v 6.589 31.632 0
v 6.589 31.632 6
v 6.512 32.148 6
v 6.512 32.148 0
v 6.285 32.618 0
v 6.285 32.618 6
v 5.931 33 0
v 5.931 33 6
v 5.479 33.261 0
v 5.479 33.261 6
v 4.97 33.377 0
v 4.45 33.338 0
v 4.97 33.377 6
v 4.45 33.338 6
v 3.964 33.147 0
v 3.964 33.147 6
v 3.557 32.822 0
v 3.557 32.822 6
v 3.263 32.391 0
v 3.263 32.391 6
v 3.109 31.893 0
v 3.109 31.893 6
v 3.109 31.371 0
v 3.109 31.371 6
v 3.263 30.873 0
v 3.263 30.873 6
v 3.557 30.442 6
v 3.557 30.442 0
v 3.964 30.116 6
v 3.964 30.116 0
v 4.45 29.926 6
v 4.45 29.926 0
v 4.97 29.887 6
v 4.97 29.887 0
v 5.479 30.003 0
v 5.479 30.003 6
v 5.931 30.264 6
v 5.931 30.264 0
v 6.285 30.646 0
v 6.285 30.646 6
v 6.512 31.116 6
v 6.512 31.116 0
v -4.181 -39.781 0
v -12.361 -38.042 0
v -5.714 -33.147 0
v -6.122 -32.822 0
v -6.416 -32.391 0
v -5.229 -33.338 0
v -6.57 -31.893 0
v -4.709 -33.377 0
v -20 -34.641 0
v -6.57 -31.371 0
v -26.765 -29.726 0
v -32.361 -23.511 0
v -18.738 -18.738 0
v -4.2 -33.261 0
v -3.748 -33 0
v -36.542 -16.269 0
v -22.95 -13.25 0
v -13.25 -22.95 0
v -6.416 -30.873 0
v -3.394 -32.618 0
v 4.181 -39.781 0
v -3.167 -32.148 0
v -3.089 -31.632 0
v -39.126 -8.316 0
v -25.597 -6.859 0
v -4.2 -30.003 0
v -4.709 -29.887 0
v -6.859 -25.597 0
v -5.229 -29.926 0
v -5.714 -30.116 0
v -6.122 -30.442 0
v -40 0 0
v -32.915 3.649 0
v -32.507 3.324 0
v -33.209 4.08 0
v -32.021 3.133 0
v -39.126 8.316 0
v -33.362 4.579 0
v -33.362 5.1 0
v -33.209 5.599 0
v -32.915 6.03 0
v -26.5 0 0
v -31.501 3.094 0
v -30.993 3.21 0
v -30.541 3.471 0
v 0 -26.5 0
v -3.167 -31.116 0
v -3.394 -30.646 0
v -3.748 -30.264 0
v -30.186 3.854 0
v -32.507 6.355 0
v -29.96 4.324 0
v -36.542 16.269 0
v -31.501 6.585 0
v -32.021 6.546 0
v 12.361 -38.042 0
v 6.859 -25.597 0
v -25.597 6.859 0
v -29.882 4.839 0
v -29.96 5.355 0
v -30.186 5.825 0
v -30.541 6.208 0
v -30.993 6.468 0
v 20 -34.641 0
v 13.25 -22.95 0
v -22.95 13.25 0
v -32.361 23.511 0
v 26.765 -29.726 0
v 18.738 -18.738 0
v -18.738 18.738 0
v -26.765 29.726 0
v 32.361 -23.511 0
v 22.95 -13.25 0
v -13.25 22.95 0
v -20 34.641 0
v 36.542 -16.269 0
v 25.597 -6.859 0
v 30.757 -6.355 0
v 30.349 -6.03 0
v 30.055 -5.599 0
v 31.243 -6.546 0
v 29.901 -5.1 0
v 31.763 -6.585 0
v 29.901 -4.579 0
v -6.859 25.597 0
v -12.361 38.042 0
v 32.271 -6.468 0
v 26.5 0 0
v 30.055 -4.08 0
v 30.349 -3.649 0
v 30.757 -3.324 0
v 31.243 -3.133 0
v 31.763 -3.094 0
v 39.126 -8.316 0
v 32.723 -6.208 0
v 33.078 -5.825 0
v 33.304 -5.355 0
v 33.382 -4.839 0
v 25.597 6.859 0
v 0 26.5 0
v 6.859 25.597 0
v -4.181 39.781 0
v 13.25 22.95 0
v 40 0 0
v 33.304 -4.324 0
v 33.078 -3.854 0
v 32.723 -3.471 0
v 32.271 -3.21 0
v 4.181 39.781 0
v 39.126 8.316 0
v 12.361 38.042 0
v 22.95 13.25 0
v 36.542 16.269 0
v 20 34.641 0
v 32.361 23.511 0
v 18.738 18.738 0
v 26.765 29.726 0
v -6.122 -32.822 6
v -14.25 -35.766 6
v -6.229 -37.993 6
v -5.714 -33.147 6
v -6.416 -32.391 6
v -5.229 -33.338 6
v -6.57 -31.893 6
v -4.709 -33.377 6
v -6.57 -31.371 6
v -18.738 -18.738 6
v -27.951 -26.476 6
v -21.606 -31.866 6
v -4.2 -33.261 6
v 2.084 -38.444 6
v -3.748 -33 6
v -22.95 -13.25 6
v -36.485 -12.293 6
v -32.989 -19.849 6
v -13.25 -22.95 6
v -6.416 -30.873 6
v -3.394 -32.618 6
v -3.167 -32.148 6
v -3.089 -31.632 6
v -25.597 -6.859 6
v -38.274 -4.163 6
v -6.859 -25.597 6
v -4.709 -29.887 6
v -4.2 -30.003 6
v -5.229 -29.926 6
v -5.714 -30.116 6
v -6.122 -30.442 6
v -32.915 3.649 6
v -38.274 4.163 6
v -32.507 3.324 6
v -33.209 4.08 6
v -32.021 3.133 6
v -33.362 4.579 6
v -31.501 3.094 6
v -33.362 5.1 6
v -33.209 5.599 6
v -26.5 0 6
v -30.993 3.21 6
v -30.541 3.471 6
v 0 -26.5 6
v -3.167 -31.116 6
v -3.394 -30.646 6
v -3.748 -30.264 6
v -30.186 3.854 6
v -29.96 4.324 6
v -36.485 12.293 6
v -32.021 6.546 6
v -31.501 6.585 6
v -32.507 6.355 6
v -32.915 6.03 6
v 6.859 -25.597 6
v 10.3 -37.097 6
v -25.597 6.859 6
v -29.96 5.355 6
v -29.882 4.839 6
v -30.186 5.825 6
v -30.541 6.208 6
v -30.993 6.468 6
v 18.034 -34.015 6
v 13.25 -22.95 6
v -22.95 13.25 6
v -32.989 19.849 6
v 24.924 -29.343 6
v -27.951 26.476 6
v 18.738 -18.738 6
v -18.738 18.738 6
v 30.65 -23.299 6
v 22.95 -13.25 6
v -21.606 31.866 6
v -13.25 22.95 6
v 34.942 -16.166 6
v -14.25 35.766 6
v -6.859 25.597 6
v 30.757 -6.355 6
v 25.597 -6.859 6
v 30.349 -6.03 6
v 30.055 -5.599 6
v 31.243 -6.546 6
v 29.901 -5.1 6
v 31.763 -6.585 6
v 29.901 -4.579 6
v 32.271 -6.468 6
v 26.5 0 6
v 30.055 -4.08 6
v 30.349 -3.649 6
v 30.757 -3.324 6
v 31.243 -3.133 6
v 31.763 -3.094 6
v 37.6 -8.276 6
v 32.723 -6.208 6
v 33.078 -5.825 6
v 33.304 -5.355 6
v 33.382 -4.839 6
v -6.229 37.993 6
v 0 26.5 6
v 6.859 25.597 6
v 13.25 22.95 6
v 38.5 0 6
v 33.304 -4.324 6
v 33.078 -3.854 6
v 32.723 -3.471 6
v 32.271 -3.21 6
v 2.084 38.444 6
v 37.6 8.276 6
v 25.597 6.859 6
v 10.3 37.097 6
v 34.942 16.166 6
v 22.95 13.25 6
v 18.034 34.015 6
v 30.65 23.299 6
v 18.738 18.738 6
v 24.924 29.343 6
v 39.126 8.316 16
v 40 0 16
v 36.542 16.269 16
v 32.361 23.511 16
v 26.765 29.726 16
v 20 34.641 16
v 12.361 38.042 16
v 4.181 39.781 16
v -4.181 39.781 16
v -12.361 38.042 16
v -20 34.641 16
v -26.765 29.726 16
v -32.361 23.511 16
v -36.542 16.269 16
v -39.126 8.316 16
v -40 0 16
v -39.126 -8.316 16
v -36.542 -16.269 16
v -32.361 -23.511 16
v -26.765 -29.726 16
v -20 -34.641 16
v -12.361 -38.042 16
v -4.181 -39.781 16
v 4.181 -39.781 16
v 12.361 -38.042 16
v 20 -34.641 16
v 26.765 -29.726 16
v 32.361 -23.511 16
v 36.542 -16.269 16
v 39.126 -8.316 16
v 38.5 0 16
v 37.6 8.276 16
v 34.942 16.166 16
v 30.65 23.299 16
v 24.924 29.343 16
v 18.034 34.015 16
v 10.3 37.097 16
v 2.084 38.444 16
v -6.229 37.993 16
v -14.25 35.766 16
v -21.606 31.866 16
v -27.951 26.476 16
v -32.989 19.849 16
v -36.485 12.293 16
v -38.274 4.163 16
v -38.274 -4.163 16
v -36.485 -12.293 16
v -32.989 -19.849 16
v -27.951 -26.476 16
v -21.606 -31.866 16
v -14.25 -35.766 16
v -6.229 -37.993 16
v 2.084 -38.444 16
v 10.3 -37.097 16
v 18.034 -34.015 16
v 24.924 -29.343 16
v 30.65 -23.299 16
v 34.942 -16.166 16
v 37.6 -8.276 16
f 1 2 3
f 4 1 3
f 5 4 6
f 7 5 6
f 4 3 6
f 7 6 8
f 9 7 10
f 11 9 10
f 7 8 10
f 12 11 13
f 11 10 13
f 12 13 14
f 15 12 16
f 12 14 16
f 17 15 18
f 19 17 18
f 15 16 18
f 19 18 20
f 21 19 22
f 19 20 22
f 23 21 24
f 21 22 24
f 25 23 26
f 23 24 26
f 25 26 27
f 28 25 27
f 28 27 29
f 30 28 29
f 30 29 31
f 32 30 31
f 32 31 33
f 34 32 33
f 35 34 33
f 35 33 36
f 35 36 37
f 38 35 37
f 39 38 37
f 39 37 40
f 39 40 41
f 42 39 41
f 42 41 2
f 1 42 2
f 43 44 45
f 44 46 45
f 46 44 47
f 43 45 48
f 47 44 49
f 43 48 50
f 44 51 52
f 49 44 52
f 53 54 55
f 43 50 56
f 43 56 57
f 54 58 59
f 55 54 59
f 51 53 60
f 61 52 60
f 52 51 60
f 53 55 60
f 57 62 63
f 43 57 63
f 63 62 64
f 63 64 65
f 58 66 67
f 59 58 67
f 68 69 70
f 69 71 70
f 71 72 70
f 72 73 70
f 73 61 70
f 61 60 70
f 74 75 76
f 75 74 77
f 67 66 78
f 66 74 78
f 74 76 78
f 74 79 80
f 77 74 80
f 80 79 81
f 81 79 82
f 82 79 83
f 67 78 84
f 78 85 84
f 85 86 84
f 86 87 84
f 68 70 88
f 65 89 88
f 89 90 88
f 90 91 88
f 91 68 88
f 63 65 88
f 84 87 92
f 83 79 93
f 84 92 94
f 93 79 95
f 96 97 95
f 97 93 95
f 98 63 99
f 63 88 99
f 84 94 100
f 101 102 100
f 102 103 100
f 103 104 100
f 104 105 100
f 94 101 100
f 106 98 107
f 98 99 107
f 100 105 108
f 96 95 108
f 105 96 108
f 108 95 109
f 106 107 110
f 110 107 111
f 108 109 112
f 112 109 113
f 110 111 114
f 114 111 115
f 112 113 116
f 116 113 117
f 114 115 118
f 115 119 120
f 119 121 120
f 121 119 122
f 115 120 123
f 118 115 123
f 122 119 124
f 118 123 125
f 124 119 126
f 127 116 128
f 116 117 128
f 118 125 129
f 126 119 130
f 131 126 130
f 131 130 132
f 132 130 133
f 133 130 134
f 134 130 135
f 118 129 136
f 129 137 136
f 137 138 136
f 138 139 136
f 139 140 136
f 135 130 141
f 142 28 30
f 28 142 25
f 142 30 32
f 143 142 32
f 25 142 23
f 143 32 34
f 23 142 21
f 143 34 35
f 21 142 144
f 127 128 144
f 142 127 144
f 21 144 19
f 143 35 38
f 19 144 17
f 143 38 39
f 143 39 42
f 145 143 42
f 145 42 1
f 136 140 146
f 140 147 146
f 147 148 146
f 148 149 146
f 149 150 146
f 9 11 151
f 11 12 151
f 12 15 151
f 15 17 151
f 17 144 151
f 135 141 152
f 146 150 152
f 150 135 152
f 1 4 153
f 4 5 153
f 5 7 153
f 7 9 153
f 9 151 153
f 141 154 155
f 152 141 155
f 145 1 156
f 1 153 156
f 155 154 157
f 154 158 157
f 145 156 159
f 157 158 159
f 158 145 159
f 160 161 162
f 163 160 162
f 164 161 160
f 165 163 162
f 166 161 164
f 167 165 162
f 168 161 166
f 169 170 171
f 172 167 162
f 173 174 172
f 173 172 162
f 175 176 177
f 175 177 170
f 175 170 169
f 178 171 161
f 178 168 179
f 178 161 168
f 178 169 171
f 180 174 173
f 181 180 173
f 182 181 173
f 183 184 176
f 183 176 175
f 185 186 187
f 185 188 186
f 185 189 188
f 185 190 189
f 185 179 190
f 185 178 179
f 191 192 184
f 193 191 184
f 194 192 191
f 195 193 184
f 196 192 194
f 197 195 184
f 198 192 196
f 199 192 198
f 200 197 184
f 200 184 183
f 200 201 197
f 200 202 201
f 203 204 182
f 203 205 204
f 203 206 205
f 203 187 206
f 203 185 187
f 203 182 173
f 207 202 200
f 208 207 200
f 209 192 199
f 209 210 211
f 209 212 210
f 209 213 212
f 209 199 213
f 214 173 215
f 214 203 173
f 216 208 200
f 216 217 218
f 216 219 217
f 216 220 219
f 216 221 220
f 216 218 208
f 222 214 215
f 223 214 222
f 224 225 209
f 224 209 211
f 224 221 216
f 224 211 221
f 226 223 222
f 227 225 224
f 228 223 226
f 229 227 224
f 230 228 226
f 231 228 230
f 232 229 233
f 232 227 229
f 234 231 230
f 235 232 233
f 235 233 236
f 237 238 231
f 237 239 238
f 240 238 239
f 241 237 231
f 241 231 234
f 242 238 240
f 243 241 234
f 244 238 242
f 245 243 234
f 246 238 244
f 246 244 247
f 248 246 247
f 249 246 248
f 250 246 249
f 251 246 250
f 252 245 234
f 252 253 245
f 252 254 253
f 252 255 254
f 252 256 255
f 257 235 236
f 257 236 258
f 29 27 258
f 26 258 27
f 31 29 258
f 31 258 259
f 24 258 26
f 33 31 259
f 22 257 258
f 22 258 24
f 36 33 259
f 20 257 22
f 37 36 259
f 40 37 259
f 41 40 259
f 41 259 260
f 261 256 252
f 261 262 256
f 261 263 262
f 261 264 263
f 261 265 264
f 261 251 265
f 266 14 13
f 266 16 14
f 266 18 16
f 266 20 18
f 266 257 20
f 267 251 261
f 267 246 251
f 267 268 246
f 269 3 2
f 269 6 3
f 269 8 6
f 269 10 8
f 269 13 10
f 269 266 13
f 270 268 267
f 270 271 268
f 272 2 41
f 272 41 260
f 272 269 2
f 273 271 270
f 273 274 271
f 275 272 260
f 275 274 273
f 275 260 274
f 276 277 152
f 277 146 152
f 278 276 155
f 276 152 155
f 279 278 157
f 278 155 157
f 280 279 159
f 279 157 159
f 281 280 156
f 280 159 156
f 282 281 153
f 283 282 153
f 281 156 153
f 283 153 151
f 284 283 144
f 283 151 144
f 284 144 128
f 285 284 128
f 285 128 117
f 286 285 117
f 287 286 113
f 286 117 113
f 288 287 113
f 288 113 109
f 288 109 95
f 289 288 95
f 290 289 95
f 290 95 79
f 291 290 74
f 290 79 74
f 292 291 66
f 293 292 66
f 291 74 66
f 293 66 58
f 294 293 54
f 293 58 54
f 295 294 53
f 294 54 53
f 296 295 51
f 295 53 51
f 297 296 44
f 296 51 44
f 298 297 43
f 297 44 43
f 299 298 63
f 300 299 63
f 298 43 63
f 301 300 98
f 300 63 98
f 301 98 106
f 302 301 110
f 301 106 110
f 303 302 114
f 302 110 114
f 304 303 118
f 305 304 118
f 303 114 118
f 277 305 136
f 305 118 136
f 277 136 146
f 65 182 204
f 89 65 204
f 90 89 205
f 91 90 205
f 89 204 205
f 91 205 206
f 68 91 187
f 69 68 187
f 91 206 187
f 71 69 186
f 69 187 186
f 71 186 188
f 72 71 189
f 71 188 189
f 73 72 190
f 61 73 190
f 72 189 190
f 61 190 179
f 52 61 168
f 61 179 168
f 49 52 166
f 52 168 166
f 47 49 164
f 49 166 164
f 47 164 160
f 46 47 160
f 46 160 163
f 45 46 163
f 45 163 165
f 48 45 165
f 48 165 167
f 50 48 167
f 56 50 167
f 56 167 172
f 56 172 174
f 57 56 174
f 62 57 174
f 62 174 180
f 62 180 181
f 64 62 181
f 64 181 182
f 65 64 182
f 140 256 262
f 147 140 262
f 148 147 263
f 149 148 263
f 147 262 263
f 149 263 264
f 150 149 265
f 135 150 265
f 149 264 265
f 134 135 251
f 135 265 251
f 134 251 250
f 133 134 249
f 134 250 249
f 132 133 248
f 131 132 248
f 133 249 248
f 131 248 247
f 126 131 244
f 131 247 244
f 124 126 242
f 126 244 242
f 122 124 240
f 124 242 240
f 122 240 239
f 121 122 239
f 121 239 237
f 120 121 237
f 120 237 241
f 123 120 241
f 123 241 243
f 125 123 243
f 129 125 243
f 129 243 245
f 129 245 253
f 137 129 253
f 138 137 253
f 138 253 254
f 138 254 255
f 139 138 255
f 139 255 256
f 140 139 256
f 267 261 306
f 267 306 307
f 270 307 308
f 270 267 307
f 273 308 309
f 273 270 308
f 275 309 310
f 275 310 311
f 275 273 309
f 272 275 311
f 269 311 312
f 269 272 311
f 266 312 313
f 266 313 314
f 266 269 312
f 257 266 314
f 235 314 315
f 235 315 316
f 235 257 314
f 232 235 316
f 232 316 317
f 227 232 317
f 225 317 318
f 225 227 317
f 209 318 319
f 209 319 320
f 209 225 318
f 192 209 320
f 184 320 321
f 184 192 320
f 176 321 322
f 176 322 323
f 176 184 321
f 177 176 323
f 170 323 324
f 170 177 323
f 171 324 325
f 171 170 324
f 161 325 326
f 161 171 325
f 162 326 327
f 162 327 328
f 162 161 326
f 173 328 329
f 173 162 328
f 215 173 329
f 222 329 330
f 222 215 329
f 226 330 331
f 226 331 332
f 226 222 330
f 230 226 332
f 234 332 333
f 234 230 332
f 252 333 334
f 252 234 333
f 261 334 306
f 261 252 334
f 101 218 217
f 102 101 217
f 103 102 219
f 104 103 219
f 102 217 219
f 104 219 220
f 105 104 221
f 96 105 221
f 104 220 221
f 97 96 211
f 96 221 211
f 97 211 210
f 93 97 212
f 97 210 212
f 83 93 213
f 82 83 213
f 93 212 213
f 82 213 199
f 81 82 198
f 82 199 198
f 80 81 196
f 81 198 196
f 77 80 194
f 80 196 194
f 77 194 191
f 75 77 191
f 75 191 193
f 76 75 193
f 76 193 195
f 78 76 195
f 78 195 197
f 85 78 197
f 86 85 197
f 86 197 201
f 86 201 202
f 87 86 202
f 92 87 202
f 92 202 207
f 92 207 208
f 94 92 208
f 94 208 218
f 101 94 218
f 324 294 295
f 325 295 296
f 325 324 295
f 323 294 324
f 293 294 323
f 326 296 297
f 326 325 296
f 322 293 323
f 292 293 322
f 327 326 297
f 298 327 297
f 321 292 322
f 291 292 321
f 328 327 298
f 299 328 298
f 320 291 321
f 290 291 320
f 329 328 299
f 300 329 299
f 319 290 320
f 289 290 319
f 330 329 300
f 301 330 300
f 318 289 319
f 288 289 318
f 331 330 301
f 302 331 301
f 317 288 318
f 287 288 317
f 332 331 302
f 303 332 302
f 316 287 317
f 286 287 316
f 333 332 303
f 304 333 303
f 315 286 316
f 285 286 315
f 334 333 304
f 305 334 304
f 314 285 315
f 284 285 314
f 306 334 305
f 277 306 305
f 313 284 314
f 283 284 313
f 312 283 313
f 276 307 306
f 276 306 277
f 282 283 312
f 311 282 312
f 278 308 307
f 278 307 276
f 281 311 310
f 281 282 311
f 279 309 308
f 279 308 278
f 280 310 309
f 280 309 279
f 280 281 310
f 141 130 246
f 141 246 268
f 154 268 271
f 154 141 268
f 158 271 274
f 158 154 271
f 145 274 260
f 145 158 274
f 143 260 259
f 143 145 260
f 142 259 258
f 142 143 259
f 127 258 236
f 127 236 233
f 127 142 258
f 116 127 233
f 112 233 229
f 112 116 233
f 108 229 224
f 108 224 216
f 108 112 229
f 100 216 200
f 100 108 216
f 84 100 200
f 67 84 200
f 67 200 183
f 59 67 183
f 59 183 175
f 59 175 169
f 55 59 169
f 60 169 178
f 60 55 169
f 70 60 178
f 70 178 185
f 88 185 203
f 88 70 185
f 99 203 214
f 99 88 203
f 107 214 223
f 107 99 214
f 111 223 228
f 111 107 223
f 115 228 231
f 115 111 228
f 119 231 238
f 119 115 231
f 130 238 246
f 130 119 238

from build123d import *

# Parameters (mm, degrees)
SKETCH1_R           = 40
SKETCH1_R_2         = 26.5
BOSS_EXTRUDE1_DEPTH = 6
SKETCH2_R           = 1.75
CUT_EXTRUDE1_DEPTH  = 7
SKETCH3_R           = 40
SKETCH3_R_2         = 38.5
BOSS_EXTRUDE2_DEPTH = 10


with BuildPart() as part:
    # Sketch1 → Boss-Extrude1 (new body)
    with BuildSketch(Plane.XY):
        Circle(SKETCH1_R)
        Circle(SKETCH1_R_2, mode=Mode.SUBTRACT)
    extrude(amount=BOSS_EXTRUDE1_DEPTH)

    # Sketch2 → Cut-Extrude1 (cut, through all)
    with BuildSketch(Plane.XY.offset(6)):
        with Locations((-31.631941874, 4.839447619)):
            Circle(SKETCH2_R)
        with Locations((4.839447619, 31.631941874)):
            Circle(SKETCH2_R)
        with Locations((31.631941874, -4.839447619)):
            Circle(SKETCH2_R)
        with Locations((-4.839447619, -31.631941874)):
            Circle(SKETCH2_R)
    extrude(amount=-CUT_EXTRUDE1_DEPTH, mode=Mode.SUBTRACT)

    # Sketch3 → Boss-Extrude2 (add)
    with BuildSketch(Plane.XY.offset(6)):
        Circle(SKETCH3_R)
        Circle(SKETCH3_R_2, mode=Mode.SUBTRACT)
    extrude(amount=BOSS_EXTRUDE2_DEPTH)


solid = part.part
